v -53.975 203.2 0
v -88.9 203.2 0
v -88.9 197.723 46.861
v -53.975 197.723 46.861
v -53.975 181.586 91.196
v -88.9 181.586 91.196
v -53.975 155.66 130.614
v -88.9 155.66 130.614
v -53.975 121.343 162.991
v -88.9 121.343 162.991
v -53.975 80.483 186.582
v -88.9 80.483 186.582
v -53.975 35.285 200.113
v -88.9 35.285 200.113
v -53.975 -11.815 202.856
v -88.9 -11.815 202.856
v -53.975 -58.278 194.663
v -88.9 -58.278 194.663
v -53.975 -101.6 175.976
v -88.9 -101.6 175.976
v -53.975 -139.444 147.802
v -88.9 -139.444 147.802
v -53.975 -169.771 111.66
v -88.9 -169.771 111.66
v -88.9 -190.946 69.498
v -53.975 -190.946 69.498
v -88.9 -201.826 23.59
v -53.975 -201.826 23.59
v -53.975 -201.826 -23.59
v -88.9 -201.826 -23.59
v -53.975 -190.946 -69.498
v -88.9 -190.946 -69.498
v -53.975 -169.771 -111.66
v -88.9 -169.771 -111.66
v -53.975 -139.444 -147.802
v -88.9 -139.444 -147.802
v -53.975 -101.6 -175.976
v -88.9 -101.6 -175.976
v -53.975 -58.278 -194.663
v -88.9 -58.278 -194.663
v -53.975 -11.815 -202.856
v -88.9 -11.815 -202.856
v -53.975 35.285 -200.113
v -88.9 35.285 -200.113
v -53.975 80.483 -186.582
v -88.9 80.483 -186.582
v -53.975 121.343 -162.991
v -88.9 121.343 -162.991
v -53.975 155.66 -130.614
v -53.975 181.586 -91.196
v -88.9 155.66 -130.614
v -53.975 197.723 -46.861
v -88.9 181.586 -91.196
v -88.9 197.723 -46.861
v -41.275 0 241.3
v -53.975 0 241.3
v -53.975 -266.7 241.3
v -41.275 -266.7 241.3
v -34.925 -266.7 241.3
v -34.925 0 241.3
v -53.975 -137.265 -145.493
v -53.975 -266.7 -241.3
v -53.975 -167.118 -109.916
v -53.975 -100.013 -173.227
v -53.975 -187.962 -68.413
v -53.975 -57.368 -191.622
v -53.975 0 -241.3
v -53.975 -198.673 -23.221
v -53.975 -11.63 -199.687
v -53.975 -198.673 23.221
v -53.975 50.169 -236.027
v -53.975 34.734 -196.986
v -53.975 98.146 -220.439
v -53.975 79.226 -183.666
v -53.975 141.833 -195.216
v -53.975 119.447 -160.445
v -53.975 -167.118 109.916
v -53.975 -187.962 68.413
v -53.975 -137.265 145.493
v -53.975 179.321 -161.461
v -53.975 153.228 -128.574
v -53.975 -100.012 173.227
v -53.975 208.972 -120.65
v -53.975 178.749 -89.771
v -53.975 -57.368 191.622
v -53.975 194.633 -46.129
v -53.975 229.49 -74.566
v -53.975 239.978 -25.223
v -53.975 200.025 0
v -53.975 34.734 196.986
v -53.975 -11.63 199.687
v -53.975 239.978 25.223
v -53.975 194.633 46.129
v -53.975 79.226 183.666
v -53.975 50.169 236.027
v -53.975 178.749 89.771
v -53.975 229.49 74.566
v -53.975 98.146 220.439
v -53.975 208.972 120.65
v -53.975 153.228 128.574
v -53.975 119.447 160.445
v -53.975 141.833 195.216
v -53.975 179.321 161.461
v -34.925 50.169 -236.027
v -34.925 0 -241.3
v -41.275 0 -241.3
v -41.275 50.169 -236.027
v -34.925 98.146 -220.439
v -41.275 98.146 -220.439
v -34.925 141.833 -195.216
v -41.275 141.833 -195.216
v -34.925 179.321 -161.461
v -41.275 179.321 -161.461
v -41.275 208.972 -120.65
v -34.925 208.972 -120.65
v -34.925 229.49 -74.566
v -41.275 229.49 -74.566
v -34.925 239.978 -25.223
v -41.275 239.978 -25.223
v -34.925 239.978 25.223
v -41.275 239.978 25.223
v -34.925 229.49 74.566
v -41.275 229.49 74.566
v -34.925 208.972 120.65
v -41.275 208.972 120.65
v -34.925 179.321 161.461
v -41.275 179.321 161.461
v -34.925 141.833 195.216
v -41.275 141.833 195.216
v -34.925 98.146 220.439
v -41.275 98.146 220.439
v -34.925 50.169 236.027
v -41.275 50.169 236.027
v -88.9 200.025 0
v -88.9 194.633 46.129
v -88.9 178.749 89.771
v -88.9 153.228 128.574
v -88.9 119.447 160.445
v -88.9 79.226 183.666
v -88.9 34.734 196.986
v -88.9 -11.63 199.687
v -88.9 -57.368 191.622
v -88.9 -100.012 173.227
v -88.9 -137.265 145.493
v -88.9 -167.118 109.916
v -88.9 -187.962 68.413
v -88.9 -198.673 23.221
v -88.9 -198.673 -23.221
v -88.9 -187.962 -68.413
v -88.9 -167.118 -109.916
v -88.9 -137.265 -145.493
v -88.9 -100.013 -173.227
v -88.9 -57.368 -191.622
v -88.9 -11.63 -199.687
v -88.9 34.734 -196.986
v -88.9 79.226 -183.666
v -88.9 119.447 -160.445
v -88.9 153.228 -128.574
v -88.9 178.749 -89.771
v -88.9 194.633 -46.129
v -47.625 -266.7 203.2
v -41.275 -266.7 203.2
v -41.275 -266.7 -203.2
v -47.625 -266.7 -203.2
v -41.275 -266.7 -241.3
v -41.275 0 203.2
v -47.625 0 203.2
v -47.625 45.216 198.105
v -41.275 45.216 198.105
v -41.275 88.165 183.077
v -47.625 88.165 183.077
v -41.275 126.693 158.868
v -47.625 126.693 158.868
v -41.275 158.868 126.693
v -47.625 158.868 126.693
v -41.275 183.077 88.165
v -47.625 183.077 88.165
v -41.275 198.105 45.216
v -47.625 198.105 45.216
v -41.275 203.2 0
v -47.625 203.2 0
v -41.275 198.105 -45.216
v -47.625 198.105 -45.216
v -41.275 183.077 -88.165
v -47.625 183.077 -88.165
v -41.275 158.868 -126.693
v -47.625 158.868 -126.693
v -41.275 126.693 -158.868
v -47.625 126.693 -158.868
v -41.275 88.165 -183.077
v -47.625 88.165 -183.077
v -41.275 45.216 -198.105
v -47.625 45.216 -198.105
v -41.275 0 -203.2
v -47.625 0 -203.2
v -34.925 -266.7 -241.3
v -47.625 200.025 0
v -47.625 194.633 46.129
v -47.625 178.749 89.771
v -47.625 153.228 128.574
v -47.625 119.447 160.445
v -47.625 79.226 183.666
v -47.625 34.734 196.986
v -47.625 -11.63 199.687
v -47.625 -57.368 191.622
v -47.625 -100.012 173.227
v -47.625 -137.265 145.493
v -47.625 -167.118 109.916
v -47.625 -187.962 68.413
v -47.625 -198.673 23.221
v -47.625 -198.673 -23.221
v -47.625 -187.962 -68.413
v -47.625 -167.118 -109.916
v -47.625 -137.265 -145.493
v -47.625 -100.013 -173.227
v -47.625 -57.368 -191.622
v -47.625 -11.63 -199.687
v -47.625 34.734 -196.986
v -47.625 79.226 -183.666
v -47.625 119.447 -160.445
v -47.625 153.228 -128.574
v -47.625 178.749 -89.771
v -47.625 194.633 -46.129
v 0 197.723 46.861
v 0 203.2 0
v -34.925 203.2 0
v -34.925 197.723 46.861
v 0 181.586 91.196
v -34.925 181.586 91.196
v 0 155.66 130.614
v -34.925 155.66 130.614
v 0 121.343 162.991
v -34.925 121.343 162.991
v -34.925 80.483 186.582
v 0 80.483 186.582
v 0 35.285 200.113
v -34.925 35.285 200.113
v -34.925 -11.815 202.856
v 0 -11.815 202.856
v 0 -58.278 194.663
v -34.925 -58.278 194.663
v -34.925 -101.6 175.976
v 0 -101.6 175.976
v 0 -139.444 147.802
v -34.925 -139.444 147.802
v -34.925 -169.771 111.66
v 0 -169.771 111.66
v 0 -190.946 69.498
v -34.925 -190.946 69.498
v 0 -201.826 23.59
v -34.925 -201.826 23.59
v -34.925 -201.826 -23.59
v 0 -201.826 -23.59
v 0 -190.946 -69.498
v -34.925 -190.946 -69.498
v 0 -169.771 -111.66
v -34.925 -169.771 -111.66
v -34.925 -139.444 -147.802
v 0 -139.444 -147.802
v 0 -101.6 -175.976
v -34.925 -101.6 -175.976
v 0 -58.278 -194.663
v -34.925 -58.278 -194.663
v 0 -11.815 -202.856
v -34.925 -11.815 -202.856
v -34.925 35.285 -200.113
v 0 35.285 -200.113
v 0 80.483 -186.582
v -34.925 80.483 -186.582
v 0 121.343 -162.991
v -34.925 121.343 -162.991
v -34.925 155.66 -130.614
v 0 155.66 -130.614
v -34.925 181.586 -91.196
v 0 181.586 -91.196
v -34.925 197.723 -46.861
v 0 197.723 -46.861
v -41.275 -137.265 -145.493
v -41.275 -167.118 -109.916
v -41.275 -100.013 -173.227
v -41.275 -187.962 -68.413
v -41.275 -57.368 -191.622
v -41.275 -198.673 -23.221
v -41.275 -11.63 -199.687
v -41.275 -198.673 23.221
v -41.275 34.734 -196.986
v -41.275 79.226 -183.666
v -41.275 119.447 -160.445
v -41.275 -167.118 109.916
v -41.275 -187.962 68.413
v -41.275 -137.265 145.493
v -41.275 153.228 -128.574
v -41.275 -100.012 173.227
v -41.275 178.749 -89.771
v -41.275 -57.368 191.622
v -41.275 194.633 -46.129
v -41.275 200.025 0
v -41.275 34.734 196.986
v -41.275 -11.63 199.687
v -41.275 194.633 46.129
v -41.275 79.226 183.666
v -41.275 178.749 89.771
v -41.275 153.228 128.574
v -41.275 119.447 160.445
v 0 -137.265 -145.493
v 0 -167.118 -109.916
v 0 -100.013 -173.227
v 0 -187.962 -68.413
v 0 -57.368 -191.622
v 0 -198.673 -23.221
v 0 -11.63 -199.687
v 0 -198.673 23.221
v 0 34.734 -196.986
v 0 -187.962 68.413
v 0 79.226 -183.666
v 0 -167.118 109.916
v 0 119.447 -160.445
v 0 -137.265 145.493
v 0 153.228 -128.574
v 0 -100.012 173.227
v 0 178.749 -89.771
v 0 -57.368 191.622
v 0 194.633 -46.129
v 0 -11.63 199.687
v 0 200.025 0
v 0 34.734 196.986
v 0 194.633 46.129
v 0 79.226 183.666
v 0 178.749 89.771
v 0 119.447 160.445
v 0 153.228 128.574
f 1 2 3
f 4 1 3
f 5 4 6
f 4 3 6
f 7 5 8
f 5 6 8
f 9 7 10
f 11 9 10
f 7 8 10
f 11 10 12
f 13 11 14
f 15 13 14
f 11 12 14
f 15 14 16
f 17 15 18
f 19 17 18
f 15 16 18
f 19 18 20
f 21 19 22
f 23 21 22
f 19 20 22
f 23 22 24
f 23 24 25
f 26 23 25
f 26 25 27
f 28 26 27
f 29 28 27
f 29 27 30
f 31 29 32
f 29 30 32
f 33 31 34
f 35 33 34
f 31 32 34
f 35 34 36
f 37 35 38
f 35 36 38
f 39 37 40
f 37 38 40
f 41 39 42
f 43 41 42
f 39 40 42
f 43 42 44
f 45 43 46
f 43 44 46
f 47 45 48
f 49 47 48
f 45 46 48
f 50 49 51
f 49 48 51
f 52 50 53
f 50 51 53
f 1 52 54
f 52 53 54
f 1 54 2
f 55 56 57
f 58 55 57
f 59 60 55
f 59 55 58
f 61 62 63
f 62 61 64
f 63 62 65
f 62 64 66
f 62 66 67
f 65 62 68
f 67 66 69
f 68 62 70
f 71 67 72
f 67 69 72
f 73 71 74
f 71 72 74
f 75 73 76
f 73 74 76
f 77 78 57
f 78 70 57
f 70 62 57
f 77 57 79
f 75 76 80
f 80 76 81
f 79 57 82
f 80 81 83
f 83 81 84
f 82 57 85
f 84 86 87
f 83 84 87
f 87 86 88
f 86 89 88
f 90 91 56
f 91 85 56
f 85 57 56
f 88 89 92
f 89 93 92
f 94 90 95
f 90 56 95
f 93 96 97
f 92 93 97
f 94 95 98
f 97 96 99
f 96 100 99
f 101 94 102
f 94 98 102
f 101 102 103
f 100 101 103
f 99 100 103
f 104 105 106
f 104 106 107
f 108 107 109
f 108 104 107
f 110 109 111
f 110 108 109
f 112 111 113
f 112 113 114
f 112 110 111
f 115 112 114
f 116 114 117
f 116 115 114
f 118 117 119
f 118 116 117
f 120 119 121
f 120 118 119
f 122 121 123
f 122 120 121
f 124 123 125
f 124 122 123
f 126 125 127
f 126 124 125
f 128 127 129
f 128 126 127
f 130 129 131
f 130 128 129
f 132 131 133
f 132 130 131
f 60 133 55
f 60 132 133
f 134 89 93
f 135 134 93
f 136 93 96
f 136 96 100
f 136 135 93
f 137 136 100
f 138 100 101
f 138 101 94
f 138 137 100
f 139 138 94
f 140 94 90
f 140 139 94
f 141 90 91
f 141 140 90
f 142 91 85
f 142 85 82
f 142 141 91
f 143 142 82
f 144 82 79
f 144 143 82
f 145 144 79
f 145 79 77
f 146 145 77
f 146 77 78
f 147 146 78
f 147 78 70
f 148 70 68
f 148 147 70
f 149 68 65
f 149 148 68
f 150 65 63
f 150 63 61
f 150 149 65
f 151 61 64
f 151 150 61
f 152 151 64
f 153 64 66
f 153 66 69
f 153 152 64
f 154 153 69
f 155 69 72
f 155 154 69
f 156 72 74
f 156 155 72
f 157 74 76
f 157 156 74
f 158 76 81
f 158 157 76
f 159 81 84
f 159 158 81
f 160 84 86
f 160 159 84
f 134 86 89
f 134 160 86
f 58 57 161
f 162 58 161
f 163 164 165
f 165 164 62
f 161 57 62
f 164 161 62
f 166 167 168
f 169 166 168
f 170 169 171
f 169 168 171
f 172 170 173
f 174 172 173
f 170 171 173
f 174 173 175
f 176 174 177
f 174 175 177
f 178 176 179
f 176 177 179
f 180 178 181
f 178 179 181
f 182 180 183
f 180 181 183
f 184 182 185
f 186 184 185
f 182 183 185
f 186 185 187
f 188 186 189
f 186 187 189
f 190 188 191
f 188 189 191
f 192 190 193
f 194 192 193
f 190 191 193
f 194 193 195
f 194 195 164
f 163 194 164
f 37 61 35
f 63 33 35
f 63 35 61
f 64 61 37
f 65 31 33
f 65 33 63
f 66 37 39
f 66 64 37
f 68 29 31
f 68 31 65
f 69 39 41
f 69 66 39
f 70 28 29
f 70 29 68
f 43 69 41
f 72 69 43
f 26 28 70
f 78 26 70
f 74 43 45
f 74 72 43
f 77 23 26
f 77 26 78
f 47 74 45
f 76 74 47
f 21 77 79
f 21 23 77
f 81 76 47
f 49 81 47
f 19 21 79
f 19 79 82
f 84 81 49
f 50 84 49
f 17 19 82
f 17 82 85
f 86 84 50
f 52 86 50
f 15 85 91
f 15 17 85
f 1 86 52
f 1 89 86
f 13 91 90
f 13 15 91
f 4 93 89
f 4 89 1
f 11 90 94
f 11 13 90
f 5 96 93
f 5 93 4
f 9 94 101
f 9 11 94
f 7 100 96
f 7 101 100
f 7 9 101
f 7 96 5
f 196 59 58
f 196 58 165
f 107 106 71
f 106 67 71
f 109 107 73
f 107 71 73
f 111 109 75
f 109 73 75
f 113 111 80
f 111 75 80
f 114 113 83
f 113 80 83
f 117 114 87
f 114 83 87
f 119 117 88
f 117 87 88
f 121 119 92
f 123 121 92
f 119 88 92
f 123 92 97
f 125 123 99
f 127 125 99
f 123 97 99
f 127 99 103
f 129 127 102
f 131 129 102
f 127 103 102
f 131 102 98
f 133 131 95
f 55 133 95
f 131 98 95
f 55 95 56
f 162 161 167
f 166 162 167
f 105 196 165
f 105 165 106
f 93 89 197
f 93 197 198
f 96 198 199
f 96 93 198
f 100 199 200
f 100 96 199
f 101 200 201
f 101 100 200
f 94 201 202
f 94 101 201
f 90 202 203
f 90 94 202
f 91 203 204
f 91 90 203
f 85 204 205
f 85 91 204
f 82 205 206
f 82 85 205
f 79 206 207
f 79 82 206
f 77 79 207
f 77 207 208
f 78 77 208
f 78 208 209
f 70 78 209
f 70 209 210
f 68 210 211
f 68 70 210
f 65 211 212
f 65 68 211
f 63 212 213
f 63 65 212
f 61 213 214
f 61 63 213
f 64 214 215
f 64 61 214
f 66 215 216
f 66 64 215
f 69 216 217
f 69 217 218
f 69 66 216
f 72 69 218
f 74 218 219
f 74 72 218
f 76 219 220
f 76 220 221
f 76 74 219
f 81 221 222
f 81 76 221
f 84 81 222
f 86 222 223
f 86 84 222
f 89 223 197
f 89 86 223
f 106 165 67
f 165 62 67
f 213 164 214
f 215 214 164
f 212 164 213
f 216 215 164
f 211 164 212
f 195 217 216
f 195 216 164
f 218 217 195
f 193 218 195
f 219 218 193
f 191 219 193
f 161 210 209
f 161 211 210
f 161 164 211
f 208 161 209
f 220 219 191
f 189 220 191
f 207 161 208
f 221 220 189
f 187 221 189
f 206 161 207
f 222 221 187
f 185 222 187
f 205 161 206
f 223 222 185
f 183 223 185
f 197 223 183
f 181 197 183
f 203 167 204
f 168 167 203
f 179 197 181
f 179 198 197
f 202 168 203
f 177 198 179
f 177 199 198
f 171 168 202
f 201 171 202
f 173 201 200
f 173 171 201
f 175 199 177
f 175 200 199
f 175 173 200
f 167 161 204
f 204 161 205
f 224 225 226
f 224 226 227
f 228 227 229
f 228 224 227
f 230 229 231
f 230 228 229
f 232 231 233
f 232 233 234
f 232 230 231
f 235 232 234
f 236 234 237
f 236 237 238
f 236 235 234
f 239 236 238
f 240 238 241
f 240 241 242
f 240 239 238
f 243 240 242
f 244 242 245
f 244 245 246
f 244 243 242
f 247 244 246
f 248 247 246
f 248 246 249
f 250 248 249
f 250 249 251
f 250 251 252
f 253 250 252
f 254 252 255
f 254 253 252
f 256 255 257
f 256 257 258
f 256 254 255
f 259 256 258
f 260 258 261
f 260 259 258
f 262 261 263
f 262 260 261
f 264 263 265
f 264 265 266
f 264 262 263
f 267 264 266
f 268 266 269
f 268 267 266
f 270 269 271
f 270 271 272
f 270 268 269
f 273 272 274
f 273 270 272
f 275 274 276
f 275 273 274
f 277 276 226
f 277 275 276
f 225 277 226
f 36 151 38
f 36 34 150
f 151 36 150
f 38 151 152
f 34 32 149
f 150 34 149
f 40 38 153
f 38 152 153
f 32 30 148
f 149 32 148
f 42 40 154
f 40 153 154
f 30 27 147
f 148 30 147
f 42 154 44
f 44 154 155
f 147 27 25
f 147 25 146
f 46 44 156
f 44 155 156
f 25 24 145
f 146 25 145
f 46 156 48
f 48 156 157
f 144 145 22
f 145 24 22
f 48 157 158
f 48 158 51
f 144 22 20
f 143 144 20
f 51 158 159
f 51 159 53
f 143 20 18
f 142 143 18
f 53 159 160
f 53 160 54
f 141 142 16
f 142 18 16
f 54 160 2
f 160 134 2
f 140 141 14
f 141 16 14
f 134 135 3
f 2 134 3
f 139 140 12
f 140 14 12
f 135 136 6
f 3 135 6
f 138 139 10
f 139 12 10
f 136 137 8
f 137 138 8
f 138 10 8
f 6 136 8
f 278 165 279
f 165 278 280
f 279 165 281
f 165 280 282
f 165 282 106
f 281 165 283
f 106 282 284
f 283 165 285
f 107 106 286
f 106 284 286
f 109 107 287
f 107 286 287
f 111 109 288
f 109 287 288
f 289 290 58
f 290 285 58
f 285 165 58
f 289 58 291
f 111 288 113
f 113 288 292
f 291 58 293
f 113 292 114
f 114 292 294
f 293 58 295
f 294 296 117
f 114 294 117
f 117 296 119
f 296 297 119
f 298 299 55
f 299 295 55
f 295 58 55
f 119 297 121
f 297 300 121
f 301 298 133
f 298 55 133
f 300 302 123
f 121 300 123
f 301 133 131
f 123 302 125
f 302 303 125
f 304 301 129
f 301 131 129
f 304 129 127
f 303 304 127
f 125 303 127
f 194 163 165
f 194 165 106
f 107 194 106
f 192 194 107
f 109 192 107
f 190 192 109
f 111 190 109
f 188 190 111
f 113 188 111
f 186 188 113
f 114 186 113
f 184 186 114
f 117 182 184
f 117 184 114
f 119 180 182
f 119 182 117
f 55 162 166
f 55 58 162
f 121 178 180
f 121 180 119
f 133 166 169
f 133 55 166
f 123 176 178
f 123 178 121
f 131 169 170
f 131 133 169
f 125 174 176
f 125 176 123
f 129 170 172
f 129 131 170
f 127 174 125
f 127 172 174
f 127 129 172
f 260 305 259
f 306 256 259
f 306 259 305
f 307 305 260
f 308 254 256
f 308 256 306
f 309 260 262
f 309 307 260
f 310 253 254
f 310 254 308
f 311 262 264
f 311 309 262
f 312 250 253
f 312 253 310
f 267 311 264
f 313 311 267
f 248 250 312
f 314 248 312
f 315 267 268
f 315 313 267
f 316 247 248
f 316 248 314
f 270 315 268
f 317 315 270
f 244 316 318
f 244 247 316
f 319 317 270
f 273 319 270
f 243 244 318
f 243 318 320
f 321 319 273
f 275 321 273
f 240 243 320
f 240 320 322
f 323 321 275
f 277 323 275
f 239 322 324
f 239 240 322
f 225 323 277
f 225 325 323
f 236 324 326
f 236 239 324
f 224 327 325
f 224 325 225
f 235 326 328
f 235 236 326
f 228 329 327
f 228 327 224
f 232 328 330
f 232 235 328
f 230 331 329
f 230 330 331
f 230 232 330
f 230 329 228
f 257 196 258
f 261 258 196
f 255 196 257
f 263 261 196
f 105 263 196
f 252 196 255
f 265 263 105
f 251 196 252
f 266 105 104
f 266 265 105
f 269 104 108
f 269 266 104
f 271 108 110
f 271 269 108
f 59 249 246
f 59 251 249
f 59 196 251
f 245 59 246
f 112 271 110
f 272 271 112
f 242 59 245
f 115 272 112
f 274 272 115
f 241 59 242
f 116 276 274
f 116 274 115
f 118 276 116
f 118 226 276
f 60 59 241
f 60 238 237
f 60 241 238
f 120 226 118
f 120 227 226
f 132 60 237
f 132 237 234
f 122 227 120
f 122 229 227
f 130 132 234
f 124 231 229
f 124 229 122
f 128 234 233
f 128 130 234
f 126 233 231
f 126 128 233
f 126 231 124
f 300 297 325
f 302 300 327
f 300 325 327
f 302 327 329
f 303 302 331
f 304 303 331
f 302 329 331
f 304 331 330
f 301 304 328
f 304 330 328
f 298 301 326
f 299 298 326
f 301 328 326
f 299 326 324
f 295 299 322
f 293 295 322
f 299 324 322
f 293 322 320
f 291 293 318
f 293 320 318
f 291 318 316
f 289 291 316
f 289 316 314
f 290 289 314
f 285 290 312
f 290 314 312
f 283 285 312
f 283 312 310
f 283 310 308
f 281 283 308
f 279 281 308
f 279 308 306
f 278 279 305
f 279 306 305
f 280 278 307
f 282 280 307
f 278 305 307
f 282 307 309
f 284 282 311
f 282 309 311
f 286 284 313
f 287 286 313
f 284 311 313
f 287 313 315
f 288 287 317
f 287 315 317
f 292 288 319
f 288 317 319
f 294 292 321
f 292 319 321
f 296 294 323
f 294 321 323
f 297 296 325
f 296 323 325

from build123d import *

# Parameters (mm, degrees)
F3_R      = 203.2
F3_R_2    = 200.025
F4_DEPTH  = 34.925
F0_R      = 203.2
F0_R_2    = 200.025
F5_DEPTH  = 34.925
F7_R      = 200.025
F8_DEPTH  = 6.35
F13_DEPTH = 6.35


with BuildPart() as f4:
    # F3 (on line) → F4 (new body)
    with BuildSketch(Plane.YZ.offset(-88.9)):
        Circle(F3_R)
        Circle(F3_R_2, mode=Mode.SUBTRACT)
    extrude(amount=F4_DEPTH)


with BuildPart() as f5:
    # F0 (on Right) → F5 (new body)
    with BuildSketch(Plane.YZ):
        Circle(F0_R)
        Circle(F0_R_2, mode=Mode.SUBTRACT)
    extrude(amount=-F5_DEPTH)

    # F10: F8 across plane


with BuildPart() as f8:
    # F7 (on offset) → F8 (new body)
    with BuildSketch(Plane.YZ.offset(-53.975)):
        with BuildLine():
            ThreePointArc((0, -241.3), (-241.3, 0), (0, 241.3))
            Line((0, 241.3), (-266.7, 241.3))
            Line((-266.7, 241.3), (-266.7, -241.3))
            Line((-266.7, -241.3), (0, -241.3))
        make_face()
        with BuildLine():
            ThreePointArc((0, -241.3), (170.6248663003, -170.6248663003), (241.3, 0))
            ThreePointArc((241.3, 0), (170.6248663003, 170.6248663003), (0, 241.3))
            ThreePointArc((0, 241.3), (-241.3, 0), (0, -241.3))
        make_face()
        Circle(F7_R, mode=Mode.SUBTRACT)
    extrude(amount=F8_DEPTH)


with BuildPart() as f5_1:
    add(f5.part)
    add(f8.part.mirror(Plane(origin=(-44.45, -82.5279579477, 0), x_dir=(0, 1, 0), z_dir=(1, 0, 0))))


with BuildPart() as f8_1:
    add(f8.part)

    # F12 (on offset) → F13 (join)
    with BuildSketch(Plane.YZ.offset(-47.625)):
        with BuildLine():
            Line((-266.7, 203.2), (0, 203.2))
            ThreePointArc((0, 203.2), (203.2, 0), (0, -203.2))
            Line((0, -203.2), (-266.7, -203.2))
            Line((-266.7, -203.2), (-266.7, -241.3))
            Line((-266.7, -241.3), (0, -241.3))
            ThreePointArc((0, -241.3), (241.3, 0), (0, 241.3))
            Line((0, 241.3), (-266.7, 241.3))
            Line((-266.7, 241.3), (-266.7, 203.2))
        make_face()
    extrude(amount=F13_DEPTH)


solid = Compound([f4.part, f5_1.part, f8_1.part])
